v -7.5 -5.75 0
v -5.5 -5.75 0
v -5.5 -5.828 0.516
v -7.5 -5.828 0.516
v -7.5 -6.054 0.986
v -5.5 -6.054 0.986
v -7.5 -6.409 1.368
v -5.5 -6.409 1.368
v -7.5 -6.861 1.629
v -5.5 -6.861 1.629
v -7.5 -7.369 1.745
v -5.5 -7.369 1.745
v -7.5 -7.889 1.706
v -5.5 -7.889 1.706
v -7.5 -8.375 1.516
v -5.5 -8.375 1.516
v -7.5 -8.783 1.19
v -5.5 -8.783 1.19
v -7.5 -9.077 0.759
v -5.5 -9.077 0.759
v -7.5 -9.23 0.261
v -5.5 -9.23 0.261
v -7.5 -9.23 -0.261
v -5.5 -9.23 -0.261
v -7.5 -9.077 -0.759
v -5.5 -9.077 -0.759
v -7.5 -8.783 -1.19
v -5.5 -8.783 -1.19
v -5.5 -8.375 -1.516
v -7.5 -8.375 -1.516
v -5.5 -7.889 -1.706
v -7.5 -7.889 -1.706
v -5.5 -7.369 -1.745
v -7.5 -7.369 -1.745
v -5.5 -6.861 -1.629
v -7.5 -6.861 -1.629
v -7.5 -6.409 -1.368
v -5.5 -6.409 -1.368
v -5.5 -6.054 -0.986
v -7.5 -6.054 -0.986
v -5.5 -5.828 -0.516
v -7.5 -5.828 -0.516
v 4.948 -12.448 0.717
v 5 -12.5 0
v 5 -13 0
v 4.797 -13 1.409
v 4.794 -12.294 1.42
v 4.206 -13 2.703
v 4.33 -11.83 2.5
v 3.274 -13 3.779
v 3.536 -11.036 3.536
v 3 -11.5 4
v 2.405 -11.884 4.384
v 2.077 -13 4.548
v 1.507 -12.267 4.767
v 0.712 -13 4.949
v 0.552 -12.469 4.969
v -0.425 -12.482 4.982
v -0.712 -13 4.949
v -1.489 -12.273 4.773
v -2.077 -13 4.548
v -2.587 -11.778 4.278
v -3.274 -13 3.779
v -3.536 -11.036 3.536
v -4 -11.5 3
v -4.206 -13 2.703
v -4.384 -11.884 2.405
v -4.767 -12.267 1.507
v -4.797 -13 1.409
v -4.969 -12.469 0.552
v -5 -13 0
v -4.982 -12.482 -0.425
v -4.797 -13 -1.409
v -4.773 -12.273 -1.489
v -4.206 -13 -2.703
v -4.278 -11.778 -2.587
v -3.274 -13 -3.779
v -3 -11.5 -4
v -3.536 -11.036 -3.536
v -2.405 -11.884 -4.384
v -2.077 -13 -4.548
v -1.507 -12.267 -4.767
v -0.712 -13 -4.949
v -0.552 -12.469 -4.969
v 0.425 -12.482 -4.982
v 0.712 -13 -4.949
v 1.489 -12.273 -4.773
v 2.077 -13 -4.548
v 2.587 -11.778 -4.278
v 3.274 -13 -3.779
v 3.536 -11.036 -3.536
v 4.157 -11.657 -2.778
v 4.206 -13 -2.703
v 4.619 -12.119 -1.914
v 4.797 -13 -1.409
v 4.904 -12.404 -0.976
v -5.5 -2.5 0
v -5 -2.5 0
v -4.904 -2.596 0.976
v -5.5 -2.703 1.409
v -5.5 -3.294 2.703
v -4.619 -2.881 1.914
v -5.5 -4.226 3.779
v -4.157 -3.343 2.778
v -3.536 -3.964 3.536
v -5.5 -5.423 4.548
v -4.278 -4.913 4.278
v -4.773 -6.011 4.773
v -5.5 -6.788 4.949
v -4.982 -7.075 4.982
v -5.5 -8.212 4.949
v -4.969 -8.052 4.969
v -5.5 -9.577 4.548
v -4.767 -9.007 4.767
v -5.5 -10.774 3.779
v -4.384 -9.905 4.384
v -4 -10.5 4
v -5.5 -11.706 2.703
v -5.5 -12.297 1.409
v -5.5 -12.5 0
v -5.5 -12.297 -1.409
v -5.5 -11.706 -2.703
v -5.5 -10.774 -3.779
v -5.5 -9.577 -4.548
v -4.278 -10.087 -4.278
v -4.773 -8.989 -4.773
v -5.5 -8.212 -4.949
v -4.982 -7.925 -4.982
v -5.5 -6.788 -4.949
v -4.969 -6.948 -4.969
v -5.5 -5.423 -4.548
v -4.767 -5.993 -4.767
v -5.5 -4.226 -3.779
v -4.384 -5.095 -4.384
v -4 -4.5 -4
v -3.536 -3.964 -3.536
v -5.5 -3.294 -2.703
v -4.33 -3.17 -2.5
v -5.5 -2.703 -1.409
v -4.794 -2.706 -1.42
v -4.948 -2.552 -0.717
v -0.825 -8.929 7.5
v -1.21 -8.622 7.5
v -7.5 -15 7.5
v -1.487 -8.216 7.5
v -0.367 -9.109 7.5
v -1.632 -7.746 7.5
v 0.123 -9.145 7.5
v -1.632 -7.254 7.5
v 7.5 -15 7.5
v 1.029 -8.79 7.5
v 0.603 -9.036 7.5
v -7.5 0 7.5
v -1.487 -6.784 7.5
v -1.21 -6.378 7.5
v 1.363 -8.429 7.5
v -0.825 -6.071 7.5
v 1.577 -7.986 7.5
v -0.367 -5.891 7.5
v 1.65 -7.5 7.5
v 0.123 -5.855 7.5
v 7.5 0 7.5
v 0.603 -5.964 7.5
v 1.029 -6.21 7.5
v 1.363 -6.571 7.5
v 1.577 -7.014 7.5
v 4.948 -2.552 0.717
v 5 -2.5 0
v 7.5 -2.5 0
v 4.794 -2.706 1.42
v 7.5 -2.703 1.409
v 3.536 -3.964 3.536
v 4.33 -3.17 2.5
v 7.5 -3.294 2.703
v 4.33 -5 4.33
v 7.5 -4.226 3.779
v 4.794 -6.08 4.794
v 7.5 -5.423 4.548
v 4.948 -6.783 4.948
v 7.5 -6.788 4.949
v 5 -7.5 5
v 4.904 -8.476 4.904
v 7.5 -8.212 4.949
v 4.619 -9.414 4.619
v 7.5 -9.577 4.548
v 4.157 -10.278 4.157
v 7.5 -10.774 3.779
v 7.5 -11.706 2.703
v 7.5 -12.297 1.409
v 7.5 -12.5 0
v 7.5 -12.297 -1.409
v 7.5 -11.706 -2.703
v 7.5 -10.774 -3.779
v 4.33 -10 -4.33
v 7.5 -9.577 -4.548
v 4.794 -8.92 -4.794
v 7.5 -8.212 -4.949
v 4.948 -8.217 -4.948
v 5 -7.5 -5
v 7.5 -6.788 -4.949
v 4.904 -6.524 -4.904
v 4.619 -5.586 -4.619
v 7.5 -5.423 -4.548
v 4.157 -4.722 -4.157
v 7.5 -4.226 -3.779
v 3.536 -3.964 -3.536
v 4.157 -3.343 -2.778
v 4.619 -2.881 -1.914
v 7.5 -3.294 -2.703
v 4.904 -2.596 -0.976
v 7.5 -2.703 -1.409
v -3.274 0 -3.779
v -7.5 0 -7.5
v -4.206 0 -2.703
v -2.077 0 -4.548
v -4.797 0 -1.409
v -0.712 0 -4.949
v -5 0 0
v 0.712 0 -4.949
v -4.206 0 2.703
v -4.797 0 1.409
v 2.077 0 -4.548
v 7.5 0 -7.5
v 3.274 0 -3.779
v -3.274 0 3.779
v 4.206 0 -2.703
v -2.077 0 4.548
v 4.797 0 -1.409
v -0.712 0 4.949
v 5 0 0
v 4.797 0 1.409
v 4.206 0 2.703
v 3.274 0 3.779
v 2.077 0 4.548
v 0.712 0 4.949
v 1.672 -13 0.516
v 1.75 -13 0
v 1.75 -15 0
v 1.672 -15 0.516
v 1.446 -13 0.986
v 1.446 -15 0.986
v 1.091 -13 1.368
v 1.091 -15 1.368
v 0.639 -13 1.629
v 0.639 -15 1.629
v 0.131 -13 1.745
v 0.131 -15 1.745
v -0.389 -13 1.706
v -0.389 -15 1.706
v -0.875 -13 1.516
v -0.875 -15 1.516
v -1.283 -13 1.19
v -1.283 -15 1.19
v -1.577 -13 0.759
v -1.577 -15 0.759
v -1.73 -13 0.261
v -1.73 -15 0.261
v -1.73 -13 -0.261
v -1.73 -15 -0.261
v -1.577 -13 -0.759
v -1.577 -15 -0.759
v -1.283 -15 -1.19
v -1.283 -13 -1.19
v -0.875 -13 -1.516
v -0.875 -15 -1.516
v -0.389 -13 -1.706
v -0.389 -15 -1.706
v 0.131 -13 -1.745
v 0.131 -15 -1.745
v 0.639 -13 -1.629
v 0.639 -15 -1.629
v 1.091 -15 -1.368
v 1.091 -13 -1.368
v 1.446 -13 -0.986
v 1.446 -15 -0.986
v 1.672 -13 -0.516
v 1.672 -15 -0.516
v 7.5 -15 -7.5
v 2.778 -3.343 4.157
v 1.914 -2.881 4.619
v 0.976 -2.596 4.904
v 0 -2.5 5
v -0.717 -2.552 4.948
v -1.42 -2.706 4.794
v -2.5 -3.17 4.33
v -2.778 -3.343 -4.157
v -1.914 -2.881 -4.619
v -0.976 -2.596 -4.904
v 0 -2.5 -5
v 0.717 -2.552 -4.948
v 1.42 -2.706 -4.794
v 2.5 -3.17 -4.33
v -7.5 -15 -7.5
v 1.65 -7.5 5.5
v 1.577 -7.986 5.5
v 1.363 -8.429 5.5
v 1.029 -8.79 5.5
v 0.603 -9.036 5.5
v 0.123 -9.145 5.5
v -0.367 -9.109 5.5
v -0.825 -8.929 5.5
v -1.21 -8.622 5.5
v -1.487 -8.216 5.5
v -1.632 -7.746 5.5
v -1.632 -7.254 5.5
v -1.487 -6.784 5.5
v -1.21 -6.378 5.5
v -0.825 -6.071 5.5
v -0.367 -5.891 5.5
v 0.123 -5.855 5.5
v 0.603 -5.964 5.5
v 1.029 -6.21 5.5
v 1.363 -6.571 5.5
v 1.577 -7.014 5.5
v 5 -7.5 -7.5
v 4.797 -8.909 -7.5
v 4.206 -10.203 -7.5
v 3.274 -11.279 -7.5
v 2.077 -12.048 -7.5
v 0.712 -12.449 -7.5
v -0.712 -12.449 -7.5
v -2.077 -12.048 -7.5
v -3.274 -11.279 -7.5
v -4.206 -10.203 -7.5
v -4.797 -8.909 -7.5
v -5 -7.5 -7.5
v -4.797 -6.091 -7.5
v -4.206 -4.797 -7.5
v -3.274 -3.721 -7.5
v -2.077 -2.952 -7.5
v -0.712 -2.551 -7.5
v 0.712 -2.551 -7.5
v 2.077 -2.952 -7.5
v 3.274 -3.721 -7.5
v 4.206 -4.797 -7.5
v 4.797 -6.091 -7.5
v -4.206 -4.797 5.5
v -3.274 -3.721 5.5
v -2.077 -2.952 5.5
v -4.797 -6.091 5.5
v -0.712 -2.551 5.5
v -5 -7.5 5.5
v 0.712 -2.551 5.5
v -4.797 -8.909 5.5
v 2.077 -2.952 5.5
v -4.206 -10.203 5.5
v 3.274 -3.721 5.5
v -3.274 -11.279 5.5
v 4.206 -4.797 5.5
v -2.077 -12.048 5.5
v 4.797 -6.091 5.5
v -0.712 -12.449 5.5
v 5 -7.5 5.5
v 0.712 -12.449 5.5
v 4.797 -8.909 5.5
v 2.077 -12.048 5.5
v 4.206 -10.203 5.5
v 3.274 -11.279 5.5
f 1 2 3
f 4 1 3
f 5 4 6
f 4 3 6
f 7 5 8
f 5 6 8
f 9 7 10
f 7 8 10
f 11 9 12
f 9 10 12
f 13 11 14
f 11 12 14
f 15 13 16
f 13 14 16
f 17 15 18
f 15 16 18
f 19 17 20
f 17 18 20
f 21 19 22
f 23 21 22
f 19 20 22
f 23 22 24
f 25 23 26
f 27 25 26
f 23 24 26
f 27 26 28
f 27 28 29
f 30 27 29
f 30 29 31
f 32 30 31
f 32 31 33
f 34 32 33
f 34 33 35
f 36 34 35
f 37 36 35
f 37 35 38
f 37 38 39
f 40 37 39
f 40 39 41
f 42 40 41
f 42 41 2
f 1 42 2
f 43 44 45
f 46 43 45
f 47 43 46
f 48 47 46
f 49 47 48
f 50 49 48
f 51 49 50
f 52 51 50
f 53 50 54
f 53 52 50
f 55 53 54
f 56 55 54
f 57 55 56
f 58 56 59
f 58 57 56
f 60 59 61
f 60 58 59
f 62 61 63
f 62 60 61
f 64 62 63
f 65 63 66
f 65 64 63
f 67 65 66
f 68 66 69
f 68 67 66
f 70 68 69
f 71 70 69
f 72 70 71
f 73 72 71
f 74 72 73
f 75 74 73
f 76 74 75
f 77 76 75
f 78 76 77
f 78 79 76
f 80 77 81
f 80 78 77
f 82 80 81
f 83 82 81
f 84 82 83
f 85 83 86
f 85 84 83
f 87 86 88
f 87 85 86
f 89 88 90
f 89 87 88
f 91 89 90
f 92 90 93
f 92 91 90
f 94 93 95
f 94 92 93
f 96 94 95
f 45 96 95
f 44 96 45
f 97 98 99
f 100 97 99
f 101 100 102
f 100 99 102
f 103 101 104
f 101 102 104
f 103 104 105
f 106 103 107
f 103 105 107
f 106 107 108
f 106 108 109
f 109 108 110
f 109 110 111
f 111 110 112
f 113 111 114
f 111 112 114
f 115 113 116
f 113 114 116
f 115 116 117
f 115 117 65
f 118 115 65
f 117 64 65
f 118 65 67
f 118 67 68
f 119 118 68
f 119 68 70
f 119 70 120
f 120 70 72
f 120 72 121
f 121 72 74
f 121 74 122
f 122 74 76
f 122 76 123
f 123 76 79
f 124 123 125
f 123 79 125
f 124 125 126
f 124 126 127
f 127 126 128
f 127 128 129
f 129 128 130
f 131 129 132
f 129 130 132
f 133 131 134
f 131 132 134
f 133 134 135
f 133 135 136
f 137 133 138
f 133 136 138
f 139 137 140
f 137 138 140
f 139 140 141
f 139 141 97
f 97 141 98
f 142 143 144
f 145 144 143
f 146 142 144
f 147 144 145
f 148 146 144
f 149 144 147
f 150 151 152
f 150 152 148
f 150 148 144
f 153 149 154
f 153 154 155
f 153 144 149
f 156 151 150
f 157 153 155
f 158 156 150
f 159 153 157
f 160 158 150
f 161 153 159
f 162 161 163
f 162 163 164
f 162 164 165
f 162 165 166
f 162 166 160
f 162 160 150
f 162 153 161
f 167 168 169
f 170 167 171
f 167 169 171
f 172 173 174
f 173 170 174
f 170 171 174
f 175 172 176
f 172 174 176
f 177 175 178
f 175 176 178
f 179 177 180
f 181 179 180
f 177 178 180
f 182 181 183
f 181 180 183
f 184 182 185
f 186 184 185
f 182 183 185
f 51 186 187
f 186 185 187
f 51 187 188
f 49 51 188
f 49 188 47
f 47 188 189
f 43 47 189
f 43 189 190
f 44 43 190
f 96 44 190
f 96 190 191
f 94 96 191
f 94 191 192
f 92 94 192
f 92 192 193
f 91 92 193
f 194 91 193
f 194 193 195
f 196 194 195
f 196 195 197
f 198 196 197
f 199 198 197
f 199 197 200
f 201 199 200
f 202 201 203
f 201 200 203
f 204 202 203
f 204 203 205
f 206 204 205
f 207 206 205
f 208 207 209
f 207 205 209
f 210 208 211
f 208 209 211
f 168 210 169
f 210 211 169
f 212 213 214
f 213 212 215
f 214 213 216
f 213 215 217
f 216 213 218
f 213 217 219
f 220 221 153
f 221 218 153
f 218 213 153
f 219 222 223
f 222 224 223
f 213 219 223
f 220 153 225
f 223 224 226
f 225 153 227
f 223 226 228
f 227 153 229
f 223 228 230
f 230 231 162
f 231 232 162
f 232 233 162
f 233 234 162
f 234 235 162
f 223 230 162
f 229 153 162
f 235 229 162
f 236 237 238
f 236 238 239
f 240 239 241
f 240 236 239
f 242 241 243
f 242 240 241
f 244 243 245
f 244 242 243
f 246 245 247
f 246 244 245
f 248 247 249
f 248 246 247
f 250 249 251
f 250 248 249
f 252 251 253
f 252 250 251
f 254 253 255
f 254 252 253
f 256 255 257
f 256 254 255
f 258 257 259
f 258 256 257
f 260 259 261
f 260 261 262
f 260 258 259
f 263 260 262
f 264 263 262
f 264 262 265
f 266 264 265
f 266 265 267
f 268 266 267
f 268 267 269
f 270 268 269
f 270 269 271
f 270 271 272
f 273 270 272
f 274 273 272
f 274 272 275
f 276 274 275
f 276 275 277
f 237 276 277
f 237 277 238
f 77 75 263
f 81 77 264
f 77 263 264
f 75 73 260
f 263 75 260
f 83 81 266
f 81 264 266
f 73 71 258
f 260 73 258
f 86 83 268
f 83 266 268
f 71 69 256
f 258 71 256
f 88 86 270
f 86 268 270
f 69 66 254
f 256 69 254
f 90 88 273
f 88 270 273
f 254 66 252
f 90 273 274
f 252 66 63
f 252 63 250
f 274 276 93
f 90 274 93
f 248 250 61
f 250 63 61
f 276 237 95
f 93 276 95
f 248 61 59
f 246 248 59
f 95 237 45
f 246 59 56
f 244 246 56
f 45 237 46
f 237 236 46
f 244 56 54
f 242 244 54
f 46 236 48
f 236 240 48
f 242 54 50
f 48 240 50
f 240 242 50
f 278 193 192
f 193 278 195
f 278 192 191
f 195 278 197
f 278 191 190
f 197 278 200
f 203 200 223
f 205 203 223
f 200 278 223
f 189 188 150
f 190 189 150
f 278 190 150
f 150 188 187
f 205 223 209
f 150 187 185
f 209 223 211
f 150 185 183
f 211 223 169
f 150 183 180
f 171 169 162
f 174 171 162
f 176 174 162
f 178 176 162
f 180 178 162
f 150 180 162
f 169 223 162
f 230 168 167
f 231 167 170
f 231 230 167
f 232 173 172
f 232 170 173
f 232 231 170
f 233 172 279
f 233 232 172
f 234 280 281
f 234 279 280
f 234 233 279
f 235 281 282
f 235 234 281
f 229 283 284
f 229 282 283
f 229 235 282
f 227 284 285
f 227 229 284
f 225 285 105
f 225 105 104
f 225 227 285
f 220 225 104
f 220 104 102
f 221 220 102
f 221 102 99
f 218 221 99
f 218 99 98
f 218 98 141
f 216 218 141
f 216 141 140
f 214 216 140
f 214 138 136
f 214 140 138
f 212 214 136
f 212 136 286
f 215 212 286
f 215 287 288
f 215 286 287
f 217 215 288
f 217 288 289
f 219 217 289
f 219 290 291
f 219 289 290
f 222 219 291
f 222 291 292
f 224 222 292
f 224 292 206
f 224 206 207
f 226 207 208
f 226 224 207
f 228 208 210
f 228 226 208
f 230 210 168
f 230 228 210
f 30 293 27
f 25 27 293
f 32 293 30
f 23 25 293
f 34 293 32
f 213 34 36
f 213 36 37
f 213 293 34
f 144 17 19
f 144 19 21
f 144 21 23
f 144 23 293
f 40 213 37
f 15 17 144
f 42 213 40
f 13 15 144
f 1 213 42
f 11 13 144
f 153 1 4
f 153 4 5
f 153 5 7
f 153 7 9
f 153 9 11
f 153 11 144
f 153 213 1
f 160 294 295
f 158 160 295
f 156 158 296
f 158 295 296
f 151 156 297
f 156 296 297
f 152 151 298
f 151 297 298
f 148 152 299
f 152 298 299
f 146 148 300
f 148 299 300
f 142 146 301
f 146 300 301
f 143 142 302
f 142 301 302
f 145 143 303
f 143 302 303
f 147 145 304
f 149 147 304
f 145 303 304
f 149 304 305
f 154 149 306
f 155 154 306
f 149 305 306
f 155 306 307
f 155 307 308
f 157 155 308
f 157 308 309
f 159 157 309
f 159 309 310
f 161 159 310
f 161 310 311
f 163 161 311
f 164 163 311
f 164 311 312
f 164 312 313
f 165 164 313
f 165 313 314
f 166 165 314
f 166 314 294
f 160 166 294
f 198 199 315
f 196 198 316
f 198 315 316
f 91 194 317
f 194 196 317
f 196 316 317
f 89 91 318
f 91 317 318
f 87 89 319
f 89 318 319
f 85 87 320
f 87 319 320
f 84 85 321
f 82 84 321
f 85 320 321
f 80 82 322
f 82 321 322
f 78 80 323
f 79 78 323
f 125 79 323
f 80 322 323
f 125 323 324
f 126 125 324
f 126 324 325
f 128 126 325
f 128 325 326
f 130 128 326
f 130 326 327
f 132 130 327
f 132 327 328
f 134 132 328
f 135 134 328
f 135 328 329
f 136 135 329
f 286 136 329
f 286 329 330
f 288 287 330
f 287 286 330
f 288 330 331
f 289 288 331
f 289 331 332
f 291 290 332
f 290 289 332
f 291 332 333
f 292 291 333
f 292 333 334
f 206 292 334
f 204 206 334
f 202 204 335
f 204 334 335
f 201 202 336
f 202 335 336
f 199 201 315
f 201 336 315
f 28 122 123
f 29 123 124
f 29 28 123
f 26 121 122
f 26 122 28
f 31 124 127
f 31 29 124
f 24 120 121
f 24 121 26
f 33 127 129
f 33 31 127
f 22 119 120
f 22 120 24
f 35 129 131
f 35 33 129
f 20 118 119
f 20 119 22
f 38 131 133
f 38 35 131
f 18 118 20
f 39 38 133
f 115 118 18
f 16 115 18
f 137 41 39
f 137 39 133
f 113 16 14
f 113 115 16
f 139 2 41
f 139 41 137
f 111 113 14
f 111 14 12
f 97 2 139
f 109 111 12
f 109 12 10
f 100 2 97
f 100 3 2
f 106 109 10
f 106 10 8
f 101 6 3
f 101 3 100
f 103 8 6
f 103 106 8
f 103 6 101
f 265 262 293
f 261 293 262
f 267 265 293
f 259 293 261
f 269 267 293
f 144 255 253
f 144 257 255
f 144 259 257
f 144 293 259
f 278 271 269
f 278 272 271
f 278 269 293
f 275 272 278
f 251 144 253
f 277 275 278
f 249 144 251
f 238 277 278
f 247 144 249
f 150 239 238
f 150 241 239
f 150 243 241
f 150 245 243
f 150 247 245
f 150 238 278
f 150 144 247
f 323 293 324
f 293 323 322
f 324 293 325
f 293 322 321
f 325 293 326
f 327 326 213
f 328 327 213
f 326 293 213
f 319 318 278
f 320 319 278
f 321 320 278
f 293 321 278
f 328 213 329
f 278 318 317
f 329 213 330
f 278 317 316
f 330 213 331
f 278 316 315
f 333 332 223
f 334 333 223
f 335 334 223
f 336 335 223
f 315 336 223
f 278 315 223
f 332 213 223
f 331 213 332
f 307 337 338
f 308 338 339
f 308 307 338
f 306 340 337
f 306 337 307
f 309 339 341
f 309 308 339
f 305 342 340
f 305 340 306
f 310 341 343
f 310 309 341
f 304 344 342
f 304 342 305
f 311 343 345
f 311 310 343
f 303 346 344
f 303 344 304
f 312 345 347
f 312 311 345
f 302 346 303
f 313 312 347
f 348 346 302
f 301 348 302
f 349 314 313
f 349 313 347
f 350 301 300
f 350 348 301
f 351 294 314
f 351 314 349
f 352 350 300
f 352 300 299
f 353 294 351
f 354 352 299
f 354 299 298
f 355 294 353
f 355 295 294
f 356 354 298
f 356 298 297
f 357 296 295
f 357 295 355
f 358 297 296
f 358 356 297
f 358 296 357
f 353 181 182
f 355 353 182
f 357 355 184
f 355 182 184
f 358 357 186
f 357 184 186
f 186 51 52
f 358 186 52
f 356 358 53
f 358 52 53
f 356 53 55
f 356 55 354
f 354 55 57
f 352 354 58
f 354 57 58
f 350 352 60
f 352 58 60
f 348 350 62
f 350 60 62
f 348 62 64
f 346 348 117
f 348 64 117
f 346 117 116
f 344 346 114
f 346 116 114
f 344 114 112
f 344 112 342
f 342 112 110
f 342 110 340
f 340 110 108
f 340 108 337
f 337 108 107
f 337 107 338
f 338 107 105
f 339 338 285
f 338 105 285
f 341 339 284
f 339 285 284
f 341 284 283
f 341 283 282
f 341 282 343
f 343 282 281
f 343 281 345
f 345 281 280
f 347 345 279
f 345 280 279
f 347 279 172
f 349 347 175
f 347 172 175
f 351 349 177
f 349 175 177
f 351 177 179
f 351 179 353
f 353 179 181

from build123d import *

# Parameters (mm, degrees)
F0_W     = 15
F0_H     = 15
F0_R     = 1.75
F1_DEPTH = 15
F2_R     = 5
F3_DEPTH = 13
F4_R     = 1.75
F5_DEPTH = 15
F4_R_2   = 5
F6_DEPTH = 13
F7_R     = 1.65
F8_DEPTH = 15
F7_R_2   = 5
F9_DEPTH = 13


with BuildPart() as f1:
    # F0 (on Front) → F1 (new body)
    with BuildSketch(Plane.XZ):
        Rectangle(F0_W, F0_H)
        Circle(F0_R, mode=Mode.SUBTRACT)
    extrude(amount=F1_DEPTH)

    # F2 (on face) → F3 (cut)
    with BuildSketch(Plane.XZ):
        Circle(F2_R)
    extrude(amount=F3_DEPTH, mode=Mode.SUBTRACT)

    # F4 (on face) → F5 (cut)
    with BuildSketch(Plane.YZ.offset(7.5)):
        with Locations((-7.5, 0)):
            Circle(F4_R)
    extrude(amount=-F5_DEPTH, mode=Mode.SUBTRACT)

    # F4 (on face) → F6 (cut)
    with BuildSketch(Plane.YZ.offset(7.5)):
        with Locations((-7.5, 0)):
            Circle(F4_R_2)
        with Locations((-7.5, 0)):
            Circle(F4_R, mode=Mode.SUBTRACT)
    extrude(amount=-F6_DEPTH, mode=Mode.SUBTRACT)

    # F7 (on face) → F8 (cut)
    with BuildSketch(Plane(origin=(0, 0, -7.5), x_dir=(1, 0, 0), z_dir=(0, 0, -1))):
        with Locations((0, 7.5)):
            Circle(F7_R)
    extrude(amount=-F8_DEPTH, mode=Mode.SUBTRACT)

    # F7 (on face) → F9 (cut)
    with BuildSketch(Plane(origin=(0, 0, -7.5), x_dir=(1, 0, 0), z_dir=(0, 0, -1))):
        with Locations((0, 7.5)):
            Circle(F7_R_2)
        with Locations((0, 7.5)):
            Circle(F7_R, mode=Mode.SUBTRACT)
    extrude(amount=-F9_DEPTH, mode=Mode.SUBTRACT)


solid = f1.part
